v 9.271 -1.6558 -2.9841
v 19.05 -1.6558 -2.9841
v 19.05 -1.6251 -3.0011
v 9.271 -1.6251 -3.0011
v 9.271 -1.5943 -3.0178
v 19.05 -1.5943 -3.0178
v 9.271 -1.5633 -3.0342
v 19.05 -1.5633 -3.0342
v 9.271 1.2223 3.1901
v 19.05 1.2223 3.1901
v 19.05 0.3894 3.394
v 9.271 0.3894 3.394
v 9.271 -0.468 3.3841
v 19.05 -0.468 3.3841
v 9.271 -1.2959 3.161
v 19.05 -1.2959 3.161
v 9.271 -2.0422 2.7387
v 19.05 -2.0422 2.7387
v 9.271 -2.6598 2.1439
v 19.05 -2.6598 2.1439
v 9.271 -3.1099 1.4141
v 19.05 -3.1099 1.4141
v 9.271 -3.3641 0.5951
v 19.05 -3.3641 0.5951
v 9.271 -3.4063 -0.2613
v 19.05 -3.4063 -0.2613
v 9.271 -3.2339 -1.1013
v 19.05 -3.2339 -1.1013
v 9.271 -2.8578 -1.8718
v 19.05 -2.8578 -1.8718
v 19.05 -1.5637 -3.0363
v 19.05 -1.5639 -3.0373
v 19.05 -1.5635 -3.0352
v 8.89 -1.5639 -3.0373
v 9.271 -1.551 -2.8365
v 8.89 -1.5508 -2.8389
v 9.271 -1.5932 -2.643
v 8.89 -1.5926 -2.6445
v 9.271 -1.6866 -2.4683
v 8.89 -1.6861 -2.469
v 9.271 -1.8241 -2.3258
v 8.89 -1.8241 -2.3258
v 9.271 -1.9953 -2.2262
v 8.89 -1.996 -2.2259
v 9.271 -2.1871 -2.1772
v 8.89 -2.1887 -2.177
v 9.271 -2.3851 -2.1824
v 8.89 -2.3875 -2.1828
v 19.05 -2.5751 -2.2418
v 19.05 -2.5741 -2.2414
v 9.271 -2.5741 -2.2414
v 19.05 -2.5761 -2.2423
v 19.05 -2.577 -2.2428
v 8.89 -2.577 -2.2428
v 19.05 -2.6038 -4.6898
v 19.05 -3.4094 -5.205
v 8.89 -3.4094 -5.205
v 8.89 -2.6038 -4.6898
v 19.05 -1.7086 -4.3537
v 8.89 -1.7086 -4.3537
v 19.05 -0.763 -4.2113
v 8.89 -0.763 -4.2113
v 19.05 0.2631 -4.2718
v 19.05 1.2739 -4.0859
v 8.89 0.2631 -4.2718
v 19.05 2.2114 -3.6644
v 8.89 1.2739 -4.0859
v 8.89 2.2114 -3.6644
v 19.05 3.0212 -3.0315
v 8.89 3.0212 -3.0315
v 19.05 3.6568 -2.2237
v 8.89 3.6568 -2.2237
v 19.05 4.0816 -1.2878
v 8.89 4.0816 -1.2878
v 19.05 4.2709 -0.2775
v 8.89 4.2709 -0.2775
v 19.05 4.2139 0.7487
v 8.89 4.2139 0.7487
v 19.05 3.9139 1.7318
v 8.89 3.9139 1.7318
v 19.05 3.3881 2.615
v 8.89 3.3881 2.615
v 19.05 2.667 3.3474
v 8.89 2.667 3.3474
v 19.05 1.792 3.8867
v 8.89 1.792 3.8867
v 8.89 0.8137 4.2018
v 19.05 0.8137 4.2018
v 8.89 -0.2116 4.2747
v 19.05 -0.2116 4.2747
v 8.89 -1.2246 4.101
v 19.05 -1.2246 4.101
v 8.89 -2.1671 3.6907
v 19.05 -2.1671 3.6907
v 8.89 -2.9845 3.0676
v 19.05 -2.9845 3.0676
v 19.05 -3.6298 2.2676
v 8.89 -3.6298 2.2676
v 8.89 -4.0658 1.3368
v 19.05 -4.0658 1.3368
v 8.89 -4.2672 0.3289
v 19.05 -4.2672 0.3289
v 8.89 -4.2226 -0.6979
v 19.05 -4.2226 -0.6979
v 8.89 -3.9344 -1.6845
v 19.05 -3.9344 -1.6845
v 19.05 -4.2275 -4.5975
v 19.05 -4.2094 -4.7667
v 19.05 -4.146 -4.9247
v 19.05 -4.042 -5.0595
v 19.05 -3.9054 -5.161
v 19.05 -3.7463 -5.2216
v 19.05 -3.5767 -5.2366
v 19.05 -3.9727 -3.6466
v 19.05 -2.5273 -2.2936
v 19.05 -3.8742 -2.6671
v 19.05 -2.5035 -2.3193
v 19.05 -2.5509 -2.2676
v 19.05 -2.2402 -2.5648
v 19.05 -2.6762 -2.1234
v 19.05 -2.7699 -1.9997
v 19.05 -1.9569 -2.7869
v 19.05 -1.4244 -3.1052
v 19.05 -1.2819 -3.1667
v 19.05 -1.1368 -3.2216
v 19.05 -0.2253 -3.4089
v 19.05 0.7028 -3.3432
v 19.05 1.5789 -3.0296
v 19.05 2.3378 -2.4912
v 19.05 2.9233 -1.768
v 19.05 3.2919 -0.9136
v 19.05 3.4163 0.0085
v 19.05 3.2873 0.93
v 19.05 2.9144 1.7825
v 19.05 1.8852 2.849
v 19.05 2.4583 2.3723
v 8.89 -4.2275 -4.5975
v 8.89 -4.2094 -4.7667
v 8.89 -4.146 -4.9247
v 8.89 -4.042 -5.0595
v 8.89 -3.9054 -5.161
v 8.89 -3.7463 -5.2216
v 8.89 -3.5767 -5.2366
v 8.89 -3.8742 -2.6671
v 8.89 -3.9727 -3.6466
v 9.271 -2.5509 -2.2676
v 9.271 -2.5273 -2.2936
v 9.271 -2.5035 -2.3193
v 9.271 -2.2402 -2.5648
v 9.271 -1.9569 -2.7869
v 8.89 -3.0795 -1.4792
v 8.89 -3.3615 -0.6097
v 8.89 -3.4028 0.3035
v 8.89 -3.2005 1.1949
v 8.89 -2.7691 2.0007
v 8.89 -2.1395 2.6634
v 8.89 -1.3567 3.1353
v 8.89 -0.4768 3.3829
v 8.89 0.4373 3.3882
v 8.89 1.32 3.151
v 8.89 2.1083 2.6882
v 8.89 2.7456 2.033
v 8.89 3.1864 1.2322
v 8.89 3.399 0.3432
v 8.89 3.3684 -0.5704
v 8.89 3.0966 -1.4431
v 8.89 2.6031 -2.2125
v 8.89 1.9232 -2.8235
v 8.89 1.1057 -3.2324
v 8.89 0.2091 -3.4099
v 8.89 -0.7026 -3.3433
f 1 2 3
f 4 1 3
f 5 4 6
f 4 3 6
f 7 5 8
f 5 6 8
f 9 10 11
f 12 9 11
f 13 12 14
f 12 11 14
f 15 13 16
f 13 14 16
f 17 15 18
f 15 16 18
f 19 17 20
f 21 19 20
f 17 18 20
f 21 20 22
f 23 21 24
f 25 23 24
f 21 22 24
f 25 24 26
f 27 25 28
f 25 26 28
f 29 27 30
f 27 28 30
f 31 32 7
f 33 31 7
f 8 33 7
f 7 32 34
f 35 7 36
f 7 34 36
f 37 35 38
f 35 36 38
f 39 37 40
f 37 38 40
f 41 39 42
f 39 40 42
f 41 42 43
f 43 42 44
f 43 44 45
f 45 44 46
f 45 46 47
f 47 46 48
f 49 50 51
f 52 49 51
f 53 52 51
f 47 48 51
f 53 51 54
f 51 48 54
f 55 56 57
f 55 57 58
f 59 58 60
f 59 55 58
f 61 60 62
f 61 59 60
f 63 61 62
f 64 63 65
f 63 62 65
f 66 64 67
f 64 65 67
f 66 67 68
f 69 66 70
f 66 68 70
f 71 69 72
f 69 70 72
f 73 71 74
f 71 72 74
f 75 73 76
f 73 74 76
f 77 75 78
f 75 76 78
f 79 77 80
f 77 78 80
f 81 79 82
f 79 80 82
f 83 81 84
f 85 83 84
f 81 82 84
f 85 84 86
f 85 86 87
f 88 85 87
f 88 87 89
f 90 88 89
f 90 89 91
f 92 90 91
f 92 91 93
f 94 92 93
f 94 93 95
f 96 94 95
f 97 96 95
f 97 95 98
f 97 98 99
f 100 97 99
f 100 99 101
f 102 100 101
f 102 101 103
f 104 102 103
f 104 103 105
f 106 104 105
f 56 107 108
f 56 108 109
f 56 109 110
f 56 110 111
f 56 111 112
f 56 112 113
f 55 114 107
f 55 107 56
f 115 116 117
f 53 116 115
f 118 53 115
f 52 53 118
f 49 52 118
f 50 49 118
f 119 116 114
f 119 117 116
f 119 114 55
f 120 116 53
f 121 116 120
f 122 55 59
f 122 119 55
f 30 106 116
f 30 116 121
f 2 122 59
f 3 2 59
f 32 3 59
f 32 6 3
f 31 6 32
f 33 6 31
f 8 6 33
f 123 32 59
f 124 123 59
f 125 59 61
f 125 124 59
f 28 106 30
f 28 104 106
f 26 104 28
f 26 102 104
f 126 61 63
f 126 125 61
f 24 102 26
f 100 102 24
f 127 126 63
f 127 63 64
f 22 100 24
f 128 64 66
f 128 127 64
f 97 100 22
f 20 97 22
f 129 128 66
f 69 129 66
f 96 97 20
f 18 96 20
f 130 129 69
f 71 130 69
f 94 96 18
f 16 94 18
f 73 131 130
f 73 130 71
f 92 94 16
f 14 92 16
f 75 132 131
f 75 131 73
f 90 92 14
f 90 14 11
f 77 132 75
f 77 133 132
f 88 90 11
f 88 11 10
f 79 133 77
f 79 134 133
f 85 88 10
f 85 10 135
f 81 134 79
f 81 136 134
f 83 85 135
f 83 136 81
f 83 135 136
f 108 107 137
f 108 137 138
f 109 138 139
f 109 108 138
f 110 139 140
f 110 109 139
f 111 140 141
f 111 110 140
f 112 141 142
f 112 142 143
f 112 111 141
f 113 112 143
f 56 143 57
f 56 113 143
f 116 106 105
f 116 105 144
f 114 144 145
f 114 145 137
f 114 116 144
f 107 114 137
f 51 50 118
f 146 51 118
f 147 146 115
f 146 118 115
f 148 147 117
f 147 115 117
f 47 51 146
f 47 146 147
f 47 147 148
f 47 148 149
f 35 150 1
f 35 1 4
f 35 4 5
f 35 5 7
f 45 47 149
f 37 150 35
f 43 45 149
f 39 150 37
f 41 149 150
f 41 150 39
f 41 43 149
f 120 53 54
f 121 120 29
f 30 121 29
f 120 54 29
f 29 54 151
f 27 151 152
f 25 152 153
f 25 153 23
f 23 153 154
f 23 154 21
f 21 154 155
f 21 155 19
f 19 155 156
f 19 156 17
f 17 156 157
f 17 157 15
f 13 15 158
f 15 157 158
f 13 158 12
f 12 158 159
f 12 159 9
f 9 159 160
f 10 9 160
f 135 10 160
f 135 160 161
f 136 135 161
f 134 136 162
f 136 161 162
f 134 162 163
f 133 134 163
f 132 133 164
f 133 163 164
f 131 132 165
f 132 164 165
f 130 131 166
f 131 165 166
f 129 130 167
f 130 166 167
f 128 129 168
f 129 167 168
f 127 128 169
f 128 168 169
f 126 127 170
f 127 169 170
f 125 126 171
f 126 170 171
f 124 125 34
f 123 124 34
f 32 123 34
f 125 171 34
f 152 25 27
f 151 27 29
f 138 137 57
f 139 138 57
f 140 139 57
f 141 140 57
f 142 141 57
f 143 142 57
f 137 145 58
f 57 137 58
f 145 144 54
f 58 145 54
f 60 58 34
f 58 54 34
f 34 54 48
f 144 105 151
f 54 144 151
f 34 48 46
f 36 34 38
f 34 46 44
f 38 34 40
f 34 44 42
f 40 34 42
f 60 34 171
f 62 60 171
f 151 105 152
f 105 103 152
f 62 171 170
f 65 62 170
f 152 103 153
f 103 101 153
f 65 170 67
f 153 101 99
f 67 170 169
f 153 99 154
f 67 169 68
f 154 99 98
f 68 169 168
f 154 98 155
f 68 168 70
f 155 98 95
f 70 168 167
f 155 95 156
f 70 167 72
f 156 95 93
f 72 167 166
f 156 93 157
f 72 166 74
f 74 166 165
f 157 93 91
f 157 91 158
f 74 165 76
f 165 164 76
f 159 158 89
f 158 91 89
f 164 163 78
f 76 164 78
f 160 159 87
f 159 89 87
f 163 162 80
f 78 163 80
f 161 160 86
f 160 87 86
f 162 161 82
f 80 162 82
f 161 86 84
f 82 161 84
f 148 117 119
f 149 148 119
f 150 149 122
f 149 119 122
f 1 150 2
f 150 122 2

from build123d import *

# Parameters (mm, degrees)
F0_R     = 4.2799
F1_DEPTH = 8.89
F2_DEPTH = 10.16
F3_DEPTH = 8.89
F5_DEPTH = 9.779
F7_DEPTH = 10.16


# Not quite as in the source:
# - a feature names something its author has since deleted; it is built from what else it names


with BuildPart() as f1:
    # F0 (on Right) → F1 (new body)
    with BuildSketch(Plane.YZ):
        Circle(F0_R)
        with BuildLine():
            ThreePointArc((-2.5770476719, -2.2427507634), (-1.1973173615, 3.1996151059), (3.4163, 0))
            ThreePointArc((3.4163, 0), (1.7788031507, -2.9166701975), (-1.563921316, -3.0373106208))
            ThreePointArc((-1.563921316, -3.0373106208), (-2.1082545817, -2.6881905268), (-2.5770476719, -2.2427507634))
        make_face(mode=Mode.SUBTRACT)
        with BuildLine():
            ThreePointArc((-1.563921316, -3.0373106208), (-1.8240626008, -2.3258233831), (-2.5770476719, -2.2427507634))
            ThreePointArc((-2.5770476719, -2.2427507634), (-2.1082545817, -2.6881905268), (-1.563921316, -3.0373106208))
        make_face()
    extrude(amount=F1_DEPTH)

    # F2 (add): a face of the model
    f2_faces = [f1.faces().sort_by_distance(p)[0] for p in [
        (8.89, -4.1588461475, 0),
    ]]
    extrude(f2_faces, amount=F2_DEPTH)

    # F3 (cut): a face of the model
    f3_faces = [f1.faces().sort_by_distance(p)[0] for p in [
        (0, -4.1588461475, 0),
    ]]
    extrude(f3_faces, amount=-F3_DEPTH, mode=Mode.SUBTRACT)

    # F4 (on face) → F5 (cut)
    with BuildSketch(Plane.YZ.offset(19.05)):
        with BuildLine():
            ThreePointArc((1.222316808, 3.1901484779), (-2.6598297691, 2.1439242733), (-2.8578464427, -1.8718491926))
            ThreePointArc((-2.8578464427, -1.8718491926), (-2.7221442185, -2.0613321722), (-2.5741425301, -2.2413721494))
            ThreePointArc((-2.5741425301, -2.2413721494), (-1.8240626008, -2.3258233831), (-1.5632748259, -3.0341606246))
            ThreePointArc((-1.5632748259, -3.0341606246), (-1.3531490958, -3.134987559), (-1.1367838725, -3.2216188659))
            ThreePointArc((-1.1367838725, -3.2216188659), (2.6552480052, -2.1495961762), (2.9143968144, 1.7825254271))
            ThreePointArc((2.9143968144, 1.7825254271), (2.1811855738, 2.6219665113), (1.222316808, 3.1901484779))
        make_face()
        with BuildLine():
            ThreePointArc((-1.5632748259, -3.0341606246), (-1.8240626008, -2.3258233831), (-2.5741425301, -2.2413721494))
            ThreePointArc((-2.5741425301, -2.2413721494), (-2.5391071094, -2.2806143375), (-2.5034863371, -2.3193259716))
            ThreePointArc((-2.5034863371, -2.3193259716), (-2.1009284684, -2.6788491558), (-1.6558220878, -2.9841196383))
            ThreePointArc((-1.6558220878, -2.9841196383), (-1.6097363346, -3.009487598), (-1.5632748259, -3.0341606246))
        make_face()
    extrude(amount=-F5_DEPTH, mode=Mode.SUBTRACT)

    # F6 (on face) → F7 (join)
    with BuildSketch(Plane.YZ.offset(19.05)):
        with BuildLine():
            Line((-3.4094376469, -5.2050021479), (-3.808154026, -4.9026301131))
            Line((-3.808154026, -4.9026301131), (-4.2274528535, -4.5974798009))
            ThreePointArc((-4.2274528535, -4.5974798009), (-3.9771826251, -5.1149772874), (-3.4094376469, -5.2050021479))
        make_face()
        with BuildLine():
            ThreePointArc((-0.7629935409, -4.2113400322), (-1.5232386045, -3.9996610061), (-2.2316948802, -3.6519969841))
            Line((-2.2316948802, -3.6519969841), (-3.4094376469, -5.2050021479))
            ThreePointArc((-3.4094376469, -5.2050021479), (-2.1650447738, -4.4982234477), (-0.7629935409, -4.2113400322))
        make_face()
        with BuildLine():
            Line((-4.2274528535, -4.5974798009), (-3.0318107196, -3.0208720215))
            ThreePointArc((-3.0318107196, -3.0208720215), (-3.5466345046, -2.3956059152), (-3.9344436304, -1.6845466242))
            ThreePointArc((-3.9344436304, -1.6845466242), (-3.9036835411, -3.1588441029), (-4.2274528535, -4.5974798009))
        make_face()
        with BuildLine():
            Line((-2.6242534582, -3.3423499234), (-2.6430441595, -3.3662830512))
            ThreePointArc((-2.6430441595, -3.3662830512), (-2.4415524342, -3.515162261), (-2.2316948802, -3.6519969841))
            Line((-2.2316948802, -3.6519969841), (-2.6242534582, -3.3423499234))
        make_face()
        with BuildLine():
            ThreePointArc((-3.0318107196, -3.0208720215), (-2.8426786082, -3.1994878247), (-2.6430441595, -3.3662830512))
            Line((-2.6430441595, -3.3662830512), (-2.6242534582, -3.3423499234))
            Line((-2.6242534582, -3.3423499234), (-3.0318107196, -3.0208720215))
        make_face()
        with BuildLine():
            ThreePointArc((-2.2316948802, -3.6519969841), (-2.4415524342, -3.515162261), (-2.6430441595, -3.3662830512))
            Line((-2.6430441595, -3.3662830512), (-3.808154026, -4.9026301131))
            Line((-3.808154026, -4.9026301131), (-3.4094376469, -5.2050021479))
            Line((-3.4094376469, -5.2050021479), (-2.2316948802, -3.6519969841))
        make_face()
        with BuildLine():
            Line((-3.808154026, -4.9026301131), (-2.6430441595, -3.3662830512))
            ThreePointArc((-2.6430441595, -3.3662830512), (-2.8426786082, -3.1994878247), (-3.0318107196, -3.0208720215))
            Line((-3.0318107196, -3.0208720215), (-4.2274528535, -4.5974798009))
            Line((-4.2274528535, -4.5974798009), (-3.808154026, -4.9026301131))
        make_face()
    extrude(amount=-F7_DEPTH)


solid = f1.part
